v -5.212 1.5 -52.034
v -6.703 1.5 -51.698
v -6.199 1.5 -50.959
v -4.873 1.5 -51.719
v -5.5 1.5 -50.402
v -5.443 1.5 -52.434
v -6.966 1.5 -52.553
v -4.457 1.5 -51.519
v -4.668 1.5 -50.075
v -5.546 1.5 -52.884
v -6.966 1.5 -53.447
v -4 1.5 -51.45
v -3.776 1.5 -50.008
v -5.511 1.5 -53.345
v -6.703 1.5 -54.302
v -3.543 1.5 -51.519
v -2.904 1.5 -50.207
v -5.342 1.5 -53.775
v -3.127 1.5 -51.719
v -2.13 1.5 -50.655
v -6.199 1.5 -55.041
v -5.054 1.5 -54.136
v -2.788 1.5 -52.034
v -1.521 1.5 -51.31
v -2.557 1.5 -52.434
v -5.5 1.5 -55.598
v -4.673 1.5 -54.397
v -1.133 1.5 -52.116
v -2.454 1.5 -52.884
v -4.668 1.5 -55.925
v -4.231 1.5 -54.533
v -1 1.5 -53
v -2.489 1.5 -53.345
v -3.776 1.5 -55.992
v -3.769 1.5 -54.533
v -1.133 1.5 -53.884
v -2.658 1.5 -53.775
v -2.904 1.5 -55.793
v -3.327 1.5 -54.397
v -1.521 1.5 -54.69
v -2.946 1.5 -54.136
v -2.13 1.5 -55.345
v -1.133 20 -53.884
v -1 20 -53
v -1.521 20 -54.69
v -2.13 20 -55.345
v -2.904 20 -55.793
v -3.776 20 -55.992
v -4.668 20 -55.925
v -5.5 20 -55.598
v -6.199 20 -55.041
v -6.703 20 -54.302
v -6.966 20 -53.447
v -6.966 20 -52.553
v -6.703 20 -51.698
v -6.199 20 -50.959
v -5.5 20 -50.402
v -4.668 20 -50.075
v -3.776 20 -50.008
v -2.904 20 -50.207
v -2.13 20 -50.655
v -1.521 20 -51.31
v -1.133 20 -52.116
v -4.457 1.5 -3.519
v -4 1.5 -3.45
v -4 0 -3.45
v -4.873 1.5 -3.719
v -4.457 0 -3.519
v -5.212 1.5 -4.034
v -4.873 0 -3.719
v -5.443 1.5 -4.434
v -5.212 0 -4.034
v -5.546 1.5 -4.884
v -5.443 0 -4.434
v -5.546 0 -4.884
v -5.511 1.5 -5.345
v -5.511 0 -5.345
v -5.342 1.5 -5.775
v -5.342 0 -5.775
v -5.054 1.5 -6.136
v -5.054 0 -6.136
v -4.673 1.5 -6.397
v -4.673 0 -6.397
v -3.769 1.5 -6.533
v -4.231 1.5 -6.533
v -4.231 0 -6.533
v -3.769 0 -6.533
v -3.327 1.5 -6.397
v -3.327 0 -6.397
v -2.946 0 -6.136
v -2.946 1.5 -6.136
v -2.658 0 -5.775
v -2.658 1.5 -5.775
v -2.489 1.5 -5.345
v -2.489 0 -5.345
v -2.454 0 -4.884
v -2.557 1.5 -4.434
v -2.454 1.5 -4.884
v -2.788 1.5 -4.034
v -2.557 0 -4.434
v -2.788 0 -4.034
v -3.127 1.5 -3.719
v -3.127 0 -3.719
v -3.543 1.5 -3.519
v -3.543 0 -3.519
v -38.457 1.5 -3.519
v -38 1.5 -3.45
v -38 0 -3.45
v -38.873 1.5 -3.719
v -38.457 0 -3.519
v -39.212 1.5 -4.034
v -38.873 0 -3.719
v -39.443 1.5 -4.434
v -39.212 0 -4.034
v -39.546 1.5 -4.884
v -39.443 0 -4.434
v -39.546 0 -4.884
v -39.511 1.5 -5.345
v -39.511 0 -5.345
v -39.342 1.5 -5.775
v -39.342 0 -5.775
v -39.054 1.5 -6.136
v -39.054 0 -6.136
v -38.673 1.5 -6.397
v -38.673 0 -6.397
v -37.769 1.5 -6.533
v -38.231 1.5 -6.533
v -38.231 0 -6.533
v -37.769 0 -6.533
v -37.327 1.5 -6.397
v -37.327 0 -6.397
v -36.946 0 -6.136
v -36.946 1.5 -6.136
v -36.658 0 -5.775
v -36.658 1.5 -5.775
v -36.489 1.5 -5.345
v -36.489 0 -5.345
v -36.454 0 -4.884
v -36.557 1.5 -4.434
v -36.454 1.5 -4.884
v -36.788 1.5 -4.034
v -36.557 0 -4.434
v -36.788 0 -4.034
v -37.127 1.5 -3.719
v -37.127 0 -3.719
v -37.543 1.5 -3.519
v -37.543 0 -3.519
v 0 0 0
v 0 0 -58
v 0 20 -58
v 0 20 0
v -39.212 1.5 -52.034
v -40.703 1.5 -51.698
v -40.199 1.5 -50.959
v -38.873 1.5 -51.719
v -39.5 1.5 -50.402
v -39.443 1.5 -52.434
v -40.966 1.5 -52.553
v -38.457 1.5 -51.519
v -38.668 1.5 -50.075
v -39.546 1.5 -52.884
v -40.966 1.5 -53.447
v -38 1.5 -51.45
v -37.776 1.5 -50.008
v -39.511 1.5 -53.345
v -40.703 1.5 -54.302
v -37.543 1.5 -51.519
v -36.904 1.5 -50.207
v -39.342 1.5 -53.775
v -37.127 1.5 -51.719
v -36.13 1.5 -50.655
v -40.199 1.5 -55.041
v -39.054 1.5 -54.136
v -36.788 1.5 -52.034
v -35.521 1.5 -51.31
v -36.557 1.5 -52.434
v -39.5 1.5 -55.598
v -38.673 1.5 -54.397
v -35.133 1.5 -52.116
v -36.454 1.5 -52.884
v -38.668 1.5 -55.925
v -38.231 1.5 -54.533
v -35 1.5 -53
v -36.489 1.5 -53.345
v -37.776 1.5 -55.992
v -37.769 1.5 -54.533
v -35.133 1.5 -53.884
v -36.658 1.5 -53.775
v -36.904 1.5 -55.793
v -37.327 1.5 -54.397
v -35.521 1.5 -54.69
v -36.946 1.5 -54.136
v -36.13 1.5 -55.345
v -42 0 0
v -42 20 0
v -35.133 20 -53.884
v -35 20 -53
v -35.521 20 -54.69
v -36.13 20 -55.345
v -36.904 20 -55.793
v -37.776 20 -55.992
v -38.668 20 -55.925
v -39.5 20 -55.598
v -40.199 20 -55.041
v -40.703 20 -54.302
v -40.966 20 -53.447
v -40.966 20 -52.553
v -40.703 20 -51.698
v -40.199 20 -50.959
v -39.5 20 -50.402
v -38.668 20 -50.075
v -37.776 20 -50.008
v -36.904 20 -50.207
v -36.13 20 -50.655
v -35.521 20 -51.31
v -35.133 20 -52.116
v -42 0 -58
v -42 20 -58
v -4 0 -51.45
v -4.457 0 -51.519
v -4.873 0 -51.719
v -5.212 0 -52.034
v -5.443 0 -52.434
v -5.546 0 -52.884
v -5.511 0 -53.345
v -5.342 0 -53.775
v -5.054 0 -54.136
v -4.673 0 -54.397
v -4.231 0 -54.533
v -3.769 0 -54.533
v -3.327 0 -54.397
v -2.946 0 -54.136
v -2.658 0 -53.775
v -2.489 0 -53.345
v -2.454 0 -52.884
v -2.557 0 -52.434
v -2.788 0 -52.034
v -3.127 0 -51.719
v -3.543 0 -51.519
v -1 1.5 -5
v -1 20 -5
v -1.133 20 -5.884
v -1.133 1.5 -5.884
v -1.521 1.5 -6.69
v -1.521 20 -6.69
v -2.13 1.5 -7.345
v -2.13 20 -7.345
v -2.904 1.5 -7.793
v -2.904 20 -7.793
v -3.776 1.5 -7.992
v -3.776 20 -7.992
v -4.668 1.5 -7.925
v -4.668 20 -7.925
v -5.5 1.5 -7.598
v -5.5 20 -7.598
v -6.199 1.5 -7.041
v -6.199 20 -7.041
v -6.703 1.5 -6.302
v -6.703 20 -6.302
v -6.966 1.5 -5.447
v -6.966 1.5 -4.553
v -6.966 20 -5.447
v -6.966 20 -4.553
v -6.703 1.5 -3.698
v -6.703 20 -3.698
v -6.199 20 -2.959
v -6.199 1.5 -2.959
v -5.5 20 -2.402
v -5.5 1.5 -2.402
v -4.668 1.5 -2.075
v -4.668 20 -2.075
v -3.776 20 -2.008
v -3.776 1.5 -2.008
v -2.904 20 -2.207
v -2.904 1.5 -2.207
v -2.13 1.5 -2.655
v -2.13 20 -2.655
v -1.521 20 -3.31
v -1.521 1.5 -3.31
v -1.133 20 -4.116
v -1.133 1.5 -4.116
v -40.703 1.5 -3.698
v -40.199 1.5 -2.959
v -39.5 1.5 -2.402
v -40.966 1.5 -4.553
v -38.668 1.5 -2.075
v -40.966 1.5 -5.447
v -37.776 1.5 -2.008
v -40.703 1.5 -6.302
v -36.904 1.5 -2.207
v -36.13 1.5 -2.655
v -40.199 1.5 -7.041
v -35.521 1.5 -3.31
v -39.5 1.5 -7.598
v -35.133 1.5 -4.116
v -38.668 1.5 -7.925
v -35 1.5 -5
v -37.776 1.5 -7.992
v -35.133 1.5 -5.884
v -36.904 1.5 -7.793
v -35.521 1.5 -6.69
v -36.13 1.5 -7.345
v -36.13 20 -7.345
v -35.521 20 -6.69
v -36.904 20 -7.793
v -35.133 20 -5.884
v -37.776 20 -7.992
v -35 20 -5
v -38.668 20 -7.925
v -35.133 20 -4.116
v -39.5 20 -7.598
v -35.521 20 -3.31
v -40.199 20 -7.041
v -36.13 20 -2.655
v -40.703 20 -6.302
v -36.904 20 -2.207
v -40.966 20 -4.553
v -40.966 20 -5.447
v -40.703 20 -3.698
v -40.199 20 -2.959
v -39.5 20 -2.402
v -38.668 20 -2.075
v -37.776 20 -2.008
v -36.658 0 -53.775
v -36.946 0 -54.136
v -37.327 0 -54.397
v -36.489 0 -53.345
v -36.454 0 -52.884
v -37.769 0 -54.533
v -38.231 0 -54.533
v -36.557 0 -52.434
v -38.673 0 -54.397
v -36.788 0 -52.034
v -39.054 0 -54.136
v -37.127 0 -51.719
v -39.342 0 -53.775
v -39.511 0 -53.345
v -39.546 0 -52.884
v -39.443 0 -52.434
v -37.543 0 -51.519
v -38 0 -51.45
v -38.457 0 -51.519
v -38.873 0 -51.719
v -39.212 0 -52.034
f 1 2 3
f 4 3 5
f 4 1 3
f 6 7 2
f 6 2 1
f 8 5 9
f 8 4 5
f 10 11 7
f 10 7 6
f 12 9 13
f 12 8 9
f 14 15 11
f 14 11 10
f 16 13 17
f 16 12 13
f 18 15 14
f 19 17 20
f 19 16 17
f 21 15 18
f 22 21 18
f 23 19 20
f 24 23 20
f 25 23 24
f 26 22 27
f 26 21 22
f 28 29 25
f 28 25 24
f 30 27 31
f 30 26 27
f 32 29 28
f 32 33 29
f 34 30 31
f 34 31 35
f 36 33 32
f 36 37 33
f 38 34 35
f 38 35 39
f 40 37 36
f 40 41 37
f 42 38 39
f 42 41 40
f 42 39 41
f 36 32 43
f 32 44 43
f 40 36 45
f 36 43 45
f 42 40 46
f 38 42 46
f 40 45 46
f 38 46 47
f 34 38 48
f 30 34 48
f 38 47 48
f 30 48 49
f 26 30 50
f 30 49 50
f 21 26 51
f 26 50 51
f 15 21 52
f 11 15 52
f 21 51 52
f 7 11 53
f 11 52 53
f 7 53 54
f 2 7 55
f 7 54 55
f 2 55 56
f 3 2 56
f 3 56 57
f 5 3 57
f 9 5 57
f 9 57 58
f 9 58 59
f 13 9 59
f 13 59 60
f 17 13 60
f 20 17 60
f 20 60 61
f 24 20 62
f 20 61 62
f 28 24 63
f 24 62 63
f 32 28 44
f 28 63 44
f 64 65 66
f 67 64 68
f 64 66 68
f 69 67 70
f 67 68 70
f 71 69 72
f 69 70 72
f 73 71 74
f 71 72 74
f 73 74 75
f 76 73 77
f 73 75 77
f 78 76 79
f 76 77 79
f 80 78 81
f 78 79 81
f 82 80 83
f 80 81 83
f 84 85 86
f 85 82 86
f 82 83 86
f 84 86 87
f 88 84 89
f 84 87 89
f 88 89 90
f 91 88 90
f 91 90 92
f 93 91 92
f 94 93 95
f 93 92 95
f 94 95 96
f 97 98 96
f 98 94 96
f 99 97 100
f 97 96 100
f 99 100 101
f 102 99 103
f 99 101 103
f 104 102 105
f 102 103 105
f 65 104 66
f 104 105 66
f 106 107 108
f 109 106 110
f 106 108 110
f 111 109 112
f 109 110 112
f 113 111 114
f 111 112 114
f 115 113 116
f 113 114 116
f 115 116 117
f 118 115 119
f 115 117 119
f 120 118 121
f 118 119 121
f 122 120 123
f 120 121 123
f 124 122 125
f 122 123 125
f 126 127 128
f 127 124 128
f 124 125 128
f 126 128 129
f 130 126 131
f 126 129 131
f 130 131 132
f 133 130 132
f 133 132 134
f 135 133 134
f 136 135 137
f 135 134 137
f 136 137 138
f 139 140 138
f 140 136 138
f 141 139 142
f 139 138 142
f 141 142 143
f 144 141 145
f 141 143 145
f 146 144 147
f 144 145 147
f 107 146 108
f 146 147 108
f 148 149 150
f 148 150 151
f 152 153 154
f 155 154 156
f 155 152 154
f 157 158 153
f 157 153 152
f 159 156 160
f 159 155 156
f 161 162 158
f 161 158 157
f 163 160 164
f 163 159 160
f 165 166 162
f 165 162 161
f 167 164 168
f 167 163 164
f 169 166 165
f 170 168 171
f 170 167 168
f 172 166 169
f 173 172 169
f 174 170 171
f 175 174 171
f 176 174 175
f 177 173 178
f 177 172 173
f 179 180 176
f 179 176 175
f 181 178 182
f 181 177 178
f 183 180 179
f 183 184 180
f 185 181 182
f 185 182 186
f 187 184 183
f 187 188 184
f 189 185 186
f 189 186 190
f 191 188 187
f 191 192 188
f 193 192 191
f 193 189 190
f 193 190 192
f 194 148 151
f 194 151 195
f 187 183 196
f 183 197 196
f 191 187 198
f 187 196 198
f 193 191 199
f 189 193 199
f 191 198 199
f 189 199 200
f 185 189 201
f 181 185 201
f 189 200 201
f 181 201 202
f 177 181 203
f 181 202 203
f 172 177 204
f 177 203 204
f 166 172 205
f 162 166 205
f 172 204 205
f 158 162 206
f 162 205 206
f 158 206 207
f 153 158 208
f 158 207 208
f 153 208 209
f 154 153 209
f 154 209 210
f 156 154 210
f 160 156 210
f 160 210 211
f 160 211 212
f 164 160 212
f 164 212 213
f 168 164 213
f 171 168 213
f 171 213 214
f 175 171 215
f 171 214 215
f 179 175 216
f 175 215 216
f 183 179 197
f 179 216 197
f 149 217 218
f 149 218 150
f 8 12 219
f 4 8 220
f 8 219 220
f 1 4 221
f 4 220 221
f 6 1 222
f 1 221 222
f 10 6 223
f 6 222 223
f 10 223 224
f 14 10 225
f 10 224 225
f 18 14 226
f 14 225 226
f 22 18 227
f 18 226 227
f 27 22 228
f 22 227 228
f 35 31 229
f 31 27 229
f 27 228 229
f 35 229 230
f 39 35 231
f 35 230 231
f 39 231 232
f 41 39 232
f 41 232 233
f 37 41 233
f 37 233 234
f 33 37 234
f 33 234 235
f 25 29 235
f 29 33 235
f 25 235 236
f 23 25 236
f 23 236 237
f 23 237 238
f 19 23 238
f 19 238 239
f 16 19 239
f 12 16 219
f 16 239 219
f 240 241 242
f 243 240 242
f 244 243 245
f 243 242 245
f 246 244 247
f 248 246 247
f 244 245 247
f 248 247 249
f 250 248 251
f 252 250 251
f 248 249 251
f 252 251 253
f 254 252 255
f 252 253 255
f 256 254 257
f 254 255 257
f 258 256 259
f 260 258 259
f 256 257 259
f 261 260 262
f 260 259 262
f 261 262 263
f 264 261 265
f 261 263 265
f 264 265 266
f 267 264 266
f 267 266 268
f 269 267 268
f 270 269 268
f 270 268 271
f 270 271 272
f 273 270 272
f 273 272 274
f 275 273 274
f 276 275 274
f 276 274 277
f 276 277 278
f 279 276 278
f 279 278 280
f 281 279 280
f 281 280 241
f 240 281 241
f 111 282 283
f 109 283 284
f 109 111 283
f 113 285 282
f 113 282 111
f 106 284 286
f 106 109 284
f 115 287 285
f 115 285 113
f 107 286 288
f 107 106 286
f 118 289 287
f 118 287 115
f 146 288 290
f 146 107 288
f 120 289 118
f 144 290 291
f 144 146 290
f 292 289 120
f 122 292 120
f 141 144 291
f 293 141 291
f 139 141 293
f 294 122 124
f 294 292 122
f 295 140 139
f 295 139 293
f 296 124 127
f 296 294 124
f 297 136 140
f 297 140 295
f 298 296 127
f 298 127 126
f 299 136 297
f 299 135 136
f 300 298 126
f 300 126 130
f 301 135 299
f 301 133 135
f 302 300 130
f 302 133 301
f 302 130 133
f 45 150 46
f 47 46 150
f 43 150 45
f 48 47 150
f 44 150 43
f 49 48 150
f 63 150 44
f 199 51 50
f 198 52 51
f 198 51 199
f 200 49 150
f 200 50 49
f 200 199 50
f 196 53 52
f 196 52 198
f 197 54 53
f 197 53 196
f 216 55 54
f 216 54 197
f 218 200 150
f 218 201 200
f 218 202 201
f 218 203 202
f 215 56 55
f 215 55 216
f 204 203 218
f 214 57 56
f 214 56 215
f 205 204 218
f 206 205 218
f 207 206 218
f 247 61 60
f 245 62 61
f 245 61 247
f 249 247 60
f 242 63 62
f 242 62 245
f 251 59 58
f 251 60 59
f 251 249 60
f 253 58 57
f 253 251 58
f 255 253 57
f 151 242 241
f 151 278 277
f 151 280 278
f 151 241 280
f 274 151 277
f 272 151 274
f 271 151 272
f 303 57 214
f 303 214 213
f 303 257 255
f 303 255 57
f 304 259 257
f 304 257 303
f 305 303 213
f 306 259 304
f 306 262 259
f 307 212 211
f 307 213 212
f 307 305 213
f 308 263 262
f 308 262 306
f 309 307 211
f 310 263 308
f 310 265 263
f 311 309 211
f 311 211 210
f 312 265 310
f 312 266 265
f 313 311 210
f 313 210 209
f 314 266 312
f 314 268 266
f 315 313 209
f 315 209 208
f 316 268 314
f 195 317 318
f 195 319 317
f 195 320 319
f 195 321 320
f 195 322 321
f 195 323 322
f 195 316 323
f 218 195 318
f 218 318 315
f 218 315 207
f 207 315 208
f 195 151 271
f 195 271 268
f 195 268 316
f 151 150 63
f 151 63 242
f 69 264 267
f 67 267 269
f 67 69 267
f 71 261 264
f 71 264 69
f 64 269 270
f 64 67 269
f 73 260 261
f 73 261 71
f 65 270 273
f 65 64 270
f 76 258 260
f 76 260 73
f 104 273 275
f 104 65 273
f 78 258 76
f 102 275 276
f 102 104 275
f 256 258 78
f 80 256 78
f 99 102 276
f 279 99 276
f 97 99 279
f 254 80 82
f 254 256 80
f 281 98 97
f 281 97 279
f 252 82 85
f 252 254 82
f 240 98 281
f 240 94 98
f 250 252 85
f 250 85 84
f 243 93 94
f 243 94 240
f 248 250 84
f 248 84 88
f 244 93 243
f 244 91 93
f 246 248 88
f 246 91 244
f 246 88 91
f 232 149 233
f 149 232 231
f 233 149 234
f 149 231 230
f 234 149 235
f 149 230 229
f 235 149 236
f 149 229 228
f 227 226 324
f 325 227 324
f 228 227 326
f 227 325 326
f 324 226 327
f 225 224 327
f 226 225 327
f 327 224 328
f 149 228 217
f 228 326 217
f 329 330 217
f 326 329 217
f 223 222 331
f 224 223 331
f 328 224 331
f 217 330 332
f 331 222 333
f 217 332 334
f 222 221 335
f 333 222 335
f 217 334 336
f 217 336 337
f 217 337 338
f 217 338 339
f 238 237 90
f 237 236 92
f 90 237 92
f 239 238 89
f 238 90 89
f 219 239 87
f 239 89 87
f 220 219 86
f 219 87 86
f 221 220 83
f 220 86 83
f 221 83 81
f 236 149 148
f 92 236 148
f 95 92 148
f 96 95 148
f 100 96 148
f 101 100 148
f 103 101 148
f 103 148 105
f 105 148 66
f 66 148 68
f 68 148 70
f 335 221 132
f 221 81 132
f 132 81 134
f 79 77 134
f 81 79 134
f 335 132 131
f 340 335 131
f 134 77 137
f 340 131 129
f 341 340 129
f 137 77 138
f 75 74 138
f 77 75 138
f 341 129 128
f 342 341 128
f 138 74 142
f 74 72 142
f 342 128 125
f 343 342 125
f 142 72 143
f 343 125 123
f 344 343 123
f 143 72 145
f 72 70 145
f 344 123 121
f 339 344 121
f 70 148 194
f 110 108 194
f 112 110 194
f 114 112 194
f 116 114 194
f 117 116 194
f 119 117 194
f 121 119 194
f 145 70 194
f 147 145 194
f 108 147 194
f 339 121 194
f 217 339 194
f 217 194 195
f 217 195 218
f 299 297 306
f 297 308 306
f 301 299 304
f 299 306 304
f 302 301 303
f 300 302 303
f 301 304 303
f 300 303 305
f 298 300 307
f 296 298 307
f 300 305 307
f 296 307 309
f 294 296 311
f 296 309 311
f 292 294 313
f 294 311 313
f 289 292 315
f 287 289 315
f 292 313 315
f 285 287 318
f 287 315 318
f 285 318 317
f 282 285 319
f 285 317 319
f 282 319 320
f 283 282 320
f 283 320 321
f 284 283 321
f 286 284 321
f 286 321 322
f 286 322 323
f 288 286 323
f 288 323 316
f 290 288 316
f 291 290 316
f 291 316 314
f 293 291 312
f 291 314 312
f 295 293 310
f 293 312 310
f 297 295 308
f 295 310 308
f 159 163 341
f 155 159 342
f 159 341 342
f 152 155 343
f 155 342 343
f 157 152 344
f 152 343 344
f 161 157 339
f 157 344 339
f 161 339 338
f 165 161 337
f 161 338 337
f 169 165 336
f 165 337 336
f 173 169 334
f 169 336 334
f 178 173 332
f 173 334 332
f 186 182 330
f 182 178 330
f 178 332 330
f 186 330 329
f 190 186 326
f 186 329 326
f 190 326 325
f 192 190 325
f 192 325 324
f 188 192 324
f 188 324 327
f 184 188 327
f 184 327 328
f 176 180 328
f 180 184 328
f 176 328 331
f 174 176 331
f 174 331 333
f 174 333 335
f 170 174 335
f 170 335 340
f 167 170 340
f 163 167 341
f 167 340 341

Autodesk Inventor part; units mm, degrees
ref_plane "YZ Plane" through (0, 0, 0) normal (1, 0, 0) x (0, 1, 0)
ref_plane "XZ Plane" through (0, 0, 0) normal (0, 1, 0) x (-1, 0, 0)
ref_plane "XY Plane" through (0, 0, 0) normal (0, 0, 1) x (1, 0, 0)
sketch "Sketch1" plane through (0, 0, 0) normal (0, 1, 0) x (-1, 0, 0)
  line L0 (0, 0) -> (42, 0)
  line L1 (42, 0) -> (42, -58)
  line L2 (42, -58) -> (0, -58)
  line L3 (0, -58) -> (0, 0)
  dimension "d0" = 58
  dimension "d1" = 42
extrude "Extrusion1" add sketch "Sketch1" along normal blind 20
sketch "Sketch2" plane through (0, 20, 0) normal (0, 1, 0) x (1, 0, 0)
  line L0 (-29.2926, 35.5201) -> (-17.3649, 35.5201) construction
  line L1 (-17.3649, 35.5201) -> (-17.3649, 9.1969) construction
  line L2 (-17.3649, 9.1969) -> (-29.2926, 9.1969) construction
  line L3 (-29.2926, 9.1969) -> (-29.2926, 35.5201) construction
  spline S0 degree 2 poles (-27.9624, 31.884) (-28.3424, 31.884) (-28.8757, 32.0428) (-29.1111, 32.1562) knots 0 0 0 1 2 2 2
  line L4 (-29.1111, 32.1562) -> (-29.1111, 32.7405)
  line L5 (-29.1111, 32.7405) -> (-29.077, 32.7405)
  spline S1 degree 2 poles (-29.077, 32.7405) (-28.8473, 32.525) (-28.2658, 32.2867) (-27.9964, 32.2867) knots 0 0 0 1 2 2 2
  spline S2 degree 2 poles (-27.9964, 32.2867) (-27.6107, 32.2867) (-27.2164, 32.6072) (-27.2164, 32.871) knots 0 0 0 1 2 2 2
  spline S3 degree 2 poles (-27.2164, 32.871) (-27.2164, 33.0809) (-27.4235, 33.3418) (-27.6475, 33.4071) knots 0 0 0 1 2 2 2
  spline S4 degree 2 poles (-27.6475, 33.4071) (-27.8092, 33.4524) (-28.0787, 33.5148) (-28.28, 33.5659) knots 0 0 0 1 2 2 2
  spline S5 degree 2 poles (-28.28, 33.5659) (-28.4616, 33.6141) (-28.748, 33.7588) (-28.8586, 33.875) knots 0 0 0 1 2 2 2
  spline S6 degree 2 poles (-28.8586, 33.875) (-28.9664, 33.9913) (-29.0855, 34.3033) (-29.0855, 34.5075) knots 0 0 0 1 2 2 2
  spline S7 degree 2 poles (-29.0855, 34.5075) (-29.0855, 34.933) (-28.4218, 35.5088) (-27.9085, 35.5088) knots 0 0 0 1 2 2 2
  spline S8 degree 2 poles (-27.9085, 35.5088) (-27.6135, 35.5088) (-27.0916, 35.3925) (-26.8675, 35.2819) knots 0 0 0 1 2 2 2
  line L6 (-26.8675, 35.2819) -> (-26.8675, 34.7259)
  line L7 (-26.8675, 34.7259) -> (-26.9016, 34.7259)
  spline S9 degree 2 poles (-26.9016, 34.7259) (-27.0689, 34.8791) (-27.5908, 35.106) (-27.8773, 35.106) knots 0 0 0 1 2 2 2
  spline S10 degree 2 poles (-27.8773, 35.106) (-28.2006, 35.106) (-28.6005, 34.8025) (-28.6005, 34.5558) knots 0 0 0 1 2 2 2
  spline S11 degree 2 poles (-28.6005, 34.5558) (-28.6005, 34.3345) (-28.3651, 34.0707) (-28.1439, 34.0112) knots 0 0 0 1 2 2 2
  spline S12 degree 2 poles (-28.1439, 34.0112) (-27.9964, 33.9715) (-27.5681, 33.8694) (-27.4263, 33.8268) knots 0 0 0 1 2 2 2
  spline S13 degree 2 poles (-27.4263, 33.8268) (-27.0661, 33.7162) (-26.7314, 33.2709) (-26.7314, 32.9447) knots 0 0 0 1 2 2 2
  spline S14 degree 2 poles (-26.7314, 32.9447) (-26.7314, 32.7377) (-26.8987, 32.3406) (-27.0491, 32.2016) knots 0 0 0 1 2 2 2
  spline S15 degree 2 poles (-27.0491, 32.2016) (-27.2164, 32.0485) (-27.6419, 31.884) (-27.9624, 31.884) knots 0 0 0 1 2 2 2
  line L8 (-26.2577, 31.9464) -> (-26.2577, 35.4464)
  line L9 (-26.2577, 35.4464) -> (-24.0681, 35.4464)
  line L10 (-24.0681, 35.4464) -> (-24.0681, 35.0323)
  line L11 (-24.0681, 35.0323) -> (-25.7926, 35.0323)
  line L12 (-25.7926, 35.0323) -> (-25.7926, 34.0736)
  line L13 (-25.7926, 34.0736) -> (-24.1844, 34.0736)
  line L14 (-24.1844, 34.0736) -> (-24.1844, 33.6595)
  line L15 (-24.1844, 33.6595) -> (-25.7926, 33.6595)
  line L16 (-25.7926, 33.6595) -> (-25.7926, 32.3605)
  line L17 (-25.7926, 32.3605) -> (-24.0681, 32.3605)
  line L18 (-24.0681, 32.3605) -> (-24.0681, 31.9464)
  line L19 (-24.0681, 31.9464) -> (-26.2577, 31.9464)
  line L20 (-20.8489, 31.9464) -> (-21.453, 31.9464)
  line L21 (-21.453, 31.9464) -> (-22.5592, 33.339)
  line L22 (-22.5592, 33.339) -> (-23.0924, 33.339)
  line L23 (-23.0924, 33.339) -> (-23.0924, 31.9464)
  line L24 (-23.0924, 31.9464) -> (-23.5576, 31.9464)
  line L25 (-23.5576, 31.9464) -> (-23.5576, 35.4464)
  line L26 (-23.5576, 35.4464) -> (-22.6556, 35.4464)
  spline S16 degree 2 poles (-22.6556, 35.4464) (-22.355, 35.4464) (-21.9494, 35.3811) (-21.765, 35.262) knots 0 0 0 1 2 2 2
  spline S17 degree 2 poles (-21.765, 35.262) (-21.5807, 35.1429) (-21.368, 34.7713) (-21.368, 34.4962) knots 0 0 0 1 2 2 2
  spline S18 degree 2 poles (-21.368, 34.4962) (-21.368, 34.1133) (-21.7594, 33.5943) (-22.094, 33.4695) knots 0 0 0 1 2 2 2
  line L27 (-22.094, 33.4695) -> (-20.8489, 31.9464)
  spline S19 degree 2 poles (-21.853, 34.4593) (-21.853, 34.6125) (-21.9607, 34.8479) (-22.0742, 34.9245) knots 0 0 0 1 2 2 2
  spline S20 degree 2 poles (-22.0742, 34.9245) (-22.1735, 34.9897) (-22.4372, 35.0436) (-22.6301, 35.0436) knots 0 0 0 1 2 2 2
  line L28 (-22.6301, 35.0436) -> (-23.0924, 35.0436)
  line L29 (-23.0924, 35.0436) -> (-23.0924, 33.7276)
  line L30 (-23.0924, 33.7276) -> (-22.684, 33.7276)
  spline S21 degree 2 poles (-22.684, 33.7276) (-22.4826, 33.7276) (-22.1621, 33.7985) (-22.0515, 33.9091) knots 0 0 0 1 2 2 2
  spline S22 degree 2 poles (-22.0515, 33.9091) (-21.9494, 34.0055) (-21.853, 34.2778) (-21.853, 34.4593) knots 0 0 0 1 2 2 2
  line L31 (-18.0325, 35.4464) -> (-19.2379, 31.9464)
  line L32 (-19.2379, 31.9464) -> (-19.7399, 31.9464)
  line L33 (-19.7399, 31.9464) -> (-20.9453, 35.4464)
  line L34 (-20.9453, 35.4464) -> (-20.4462, 35.4464)
  line L35 (-20.4462, 35.4464) -> (-19.4761, 32.5391)
  line L36 (-19.4761, 32.5391) -> (-18.5061, 35.4464)
  line L37 (-18.5061, 35.4464) -> (-18.0325, 35.4464)
  spline S23 degree 2 poles (-15.2217, 35.0464) (-15.0231, 34.8139) (-14.8019, 34.1331) (-14.8019, 33.6964) knots 0 0 0 1 2 2 2
  spline S24 degree 2 poles (-14.8019, 33.6964) (-14.8019, 33.2709) (-15.0175, 32.5817) (-15.2217, 32.3491) knots 0 0 0 1 2 2 2
  spline S25 degree 2 poles (-15.2217, 32.3491) (-15.4372, 32.1052) (-16.0073, 31.8726) (-16.3505, 31.8726) knots 0 0 0 1 2 2 2
  spline S26 degree 2 poles (-16.3505, 31.8726) (-16.7051, 31.8726) (-17.2723, 32.1137) (-17.4794, 32.3491) knots 0 0 0 1 2 2 2
  spline S27 degree 2 poles (-17.4794, 32.3491) (-17.6808, 32.5817) (-17.8963, 33.2652) (-17.8963, 33.6964) knots 0 0 0 1 2 2 2
  spline S28 degree 2 poles (-17.8963, 33.6964) (-17.8963, 34.136) (-17.6779, 34.8054) (-17.4765, 35.0464) knots 0 0 0 1 2 2 2
  spline S29 degree 2 poles (-17.4765, 35.0464) (-17.2723, 35.279) (-16.7022, 35.5201) (-16.3505, 35.5201) knots 0 0 0 1 2 2 2
  spline S30 degree 2 poles (-16.3505, 35.5201) (-15.9932, 35.5201) (-15.4202, 35.2705) (-15.2217, 35.0464) knots 0 0 0 1 2 2 2
  spline S31 degree 2 poles (-15.2869, 33.6964) (-15.2869, 34.0424) (-15.4372, 34.5784) (-15.5734, 34.7543) knots 0 0 0 1 2 2 2
  spline S32 degree 2 poles (-15.5734, 34.7543) (-15.7124, 34.9358) (-16.1038, 35.1173) (-16.3477, 35.1173) knots 0 0 0 1 2 2 2
  spline S33 degree 2 poles (-16.3477, 35.1173) (-16.6001, 35.1173) (-16.9802, 34.9415) (-17.1248, 34.7543) knots 0 0 0 1 2 2 2
  spline S34 degree 2 poles (-17.1248, 34.7543) (-17.2638, 34.5756) (-17.4113, 34.0367) (-17.4113, 33.6964) knots 0 0 0 1 2 2 2
  spline S35 degree 2 poles (-17.4113, 33.6964) (-17.4113, 33.0071) (-16.8327, 32.2754) (-16.3477, 32.2754) knots 0 0 0 1 2 2 2
  spline S36 degree 2 poles (-16.3477, 32.2754) (-15.8627, 32.2754) (-15.2869, 33.0071) (-15.2869, 33.6964) knots 0 0 0 1 2 2 2
  spline S37 degree 2 poles (-26.1783, 27.9309) (-26.1783, 27.4515) (-26.5669, 26.6801) (-26.8931, 26.4645) knots 0 0 0 1 2 2 2
  spline S38 degree 2 poles (-26.8931, 26.4645) (-27.1597, 26.2972) (-27.7071, 26.1837) (-28.1325, 26.1837) knots 0 0 0 1 2 2 2
  line L38 (-28.1325, 26.1837) -> (-28.9381, 26.1837)
  line L39 (-28.9381, 26.1837) -> (-28.9381, 29.6837)
  line L40 (-28.9381, 29.6837) -> (-28.141, 29.6837)
  spline S39 degree 2 poles (-28.141, 29.6837) (-27.6475, 29.6837) (-27.0859, 29.5362) (-26.8874, 29.4057) knots 0 0 0 1 2 2 2
  spline S40 degree 2 poles (-26.8874, 29.4057) (-26.5499, 29.1817) (-26.1783, 28.4414) (-26.1783, 27.9309) knots 0 0 0 1 2 2 2
  spline S41 degree 2 poles (-26.6633, 27.9365) (-26.6633, 28.3393) (-26.9299, 28.9094) (-27.1937, 29.0711) knots 0 0 0 1 2 2 2
  spline S42 degree 2 poles (-27.1937, 29.0711) (-27.3809, 29.1817) (-27.8035, 29.2809) (-28.1184, 29.2809) knots 0 0 0 1 2 2 2
  line L41 (-28.1184, 29.2809) -> (-28.4729, 29.2809)
  line L42 (-28.4729, 29.2809) -> (-28.4729, 26.5865)
  line L43 (-28.4729, 26.5865) -> (-28.1184, 26.5865)
  spline S43 degree 2 poles (-28.1184, 26.5865) (-27.8092, 26.5865) (-27.3412, 26.6857) (-27.1512, 26.819) knots 0 0 0 1 2 2 2
  spline S44 degree 2 poles (-27.1512, 26.819) (-26.9073, 26.9835) (-26.6633, 27.5281) (-26.6633, 27.9365) knots 0 0 0 1 2 2 2
  line L44 (-22.9648, 26.1837) -> (-23.5689, 26.1837)
  line L45 (-23.5689, 26.1837) -> (-24.6751, 27.5763)
  line L46 (-24.6751, 27.5763) -> (-25.2083, 27.5763)
  line L47 (-25.2083, 27.5763) -> (-25.2083, 26.1837)
  line L48 (-25.2083, 26.1837) -> (-25.6735, 26.1837)
  line L49 (-25.6735, 26.1837) -> (-25.6735, 29.6837)
  line L50 (-25.6735, 29.6837) -> (-24.7715, 29.6837)
  spline S45 degree 2 poles (-24.7715, 29.6837) (-24.4709, 29.6837) (-24.0653, 29.6185) (-23.8809, 29.4993) knots 0 0 0 1 2 2 2
  spline S46 degree 2 poles (-23.8809, 29.4993) (-23.6966, 29.3802) (-23.4838, 29.0087) (-23.4838, 28.7335) knots 0 0 0 1 2 2 2
  spline S47 degree 2 poles (-23.4838, 28.7335) (-23.4838, 28.3506) (-23.8752, 27.8316) (-24.2099, 27.7068) knots 0 0 0 1 2 2 2
  line L51 (-24.2099, 27.7068) -> (-22.9648, 26.1837)
  spline S48 degree 2 poles (-23.9688, 28.6967) (-23.9688, 28.8498) (-24.0766, 29.0852) (-24.1901, 29.1618) knots 0 0 0 1 2 2 2
  spline S49 degree 2 poles (-24.1901, 29.1618) (-24.2893, 29.2271) (-24.5531, 29.2809) (-24.746, 29.2809) knots 0 0 0 1 2 2 2
  line L52 (-24.746, 29.2809) -> (-25.2083, 29.2809)
  line L53 (-25.2083, 29.2809) -> (-25.2083, 27.9649)
  line L54 (-25.2083, 27.9649) -> (-24.7999, 27.9649)
  spline S50 degree 2 poles (-24.7999, 27.9649) (-24.5985, 27.9649) (-24.278, 28.0358) (-24.1674, 28.1464) knots 0 0 0 1 2 2 2
  spline S51 degree 2 poles (-24.1674, 28.1464) (-24.0653, 28.2429) (-23.9688, 28.5151) (-23.9688, 28.6967) knots 0 0 0 1 2 2 2
  line L55 (-21.4672, 26.1837) -> (-22.823, 26.1837)
  line L56 (-22.823, 26.1837) -> (-22.823, 26.5411)
  line L57 (-22.823, 26.5411) -> (-22.3777, 26.5411)
  line L58 (-22.3777, 26.5411) -> (-22.3777, 29.3263)
  line L59 (-22.3777, 29.3263) -> (-22.823, 29.3263)
  line L60 (-22.823, 29.3263) -> (-22.823, 29.6837)
  line L61 (-22.823, 29.6837) -> (-21.4672, 29.6837)
  line L62 (-21.4672, 29.6837) -> (-21.4672, 29.3263)
  line L63 (-21.4672, 29.3263) -> (-21.9125, 29.3263)
  line L64 (-21.9125, 29.3263) -> (-21.9125, 26.5411)
  line L65 (-21.9125, 26.5411) -> (-21.4672, 26.5411)
  line L66 (-21.4672, 26.5411) -> (-21.4672, 26.1837)
  line L67 (-18.353, 29.6837) -> (-19.5584, 26.1837)
  line L68 (-19.5584, 26.1837) -> (-20.0604, 26.1837)
  line L69 (-20.0604, 26.1837) -> (-21.2658, 29.6837)
  line L70 (-21.2658, 29.6837) -> (-20.7667, 29.6837)
  line L71 (-20.7667, 29.6837) -> (-19.7966, 26.7765)
  line L72 (-19.7966, 26.7765) -> (-18.8266, 29.6837)
  line L73 (-18.8266, 29.6837) -> (-18.353, 29.6837)
  line L74 (-18.0183, 26.1837) -> (-18.0183, 29.6837)
  line L75 (-18.0183, 29.6837) -> (-15.8287, 29.6837)
  line L76 (-15.8287, 29.6837) -> (-15.8287, 29.2696)
  line L77 (-15.8287, 29.2696) -> (-17.5531, 29.2696)
  line L78 (-17.5531, 29.2696) -> (-17.5531, 28.3109)
  line L79 (-17.5531, 28.3109) -> (-15.9449, 28.3109)
  line L80 (-15.9449, 28.3109) -> (-15.9449, 27.8968)
  line L81 (-15.9449, 27.8968) -> (-17.5531, 27.8968)
  line L82 (-17.5531, 27.8968) -> (-17.5531, 26.5978)
  line L83 (-17.5531, 26.5978) -> (-15.8287, 26.5978)
  line L84 (-15.8287, 26.5978) -> (-15.8287, 26.1837)
  line L85 (-15.8287, 26.1837) -> (-18.0183, 26.1837)
  line L86 (-12.6094, 26.1837) -> (-13.2136, 26.1837)
  line L87 (-13.2136, 26.1837) -> (-14.3197, 27.5763)
  line L88 (-14.3197, 27.5763) -> (-14.853, 27.5763)
  line L89 (-14.853, 27.5763) -> (-14.853, 26.1837)
  line L90 (-14.853, 26.1837) -> (-15.3181, 26.1837)
  line L91 (-15.3181, 26.1837) -> (-15.3181, 29.6837)
  line L92 (-15.3181, 29.6837) -> (-14.4162, 29.6837)
  spline S52 degree 2 poles (-14.4162, 29.6837) (-14.1155, 29.6837) (-13.7099, 29.6185) (-13.5256, 29.4993) knots 0 0 0 1 2 2 2
  spline S53 degree 2 poles (-13.5256, 29.4993) (-13.3412, 29.3802) (-13.1285, 29.0087) (-13.1285, 28.7335) knots 0 0 0 1 2 2 2
  spline S54 degree 2 poles (-13.1285, 28.7335) (-13.1285, 28.3506) (-13.5199, 27.8316) (-13.8546, 27.7068) knots 0 0 0 1 2 2 2
  line L93 (-13.8546, 27.7068) -> (-12.6094, 26.1837)
  spline S55 degree 2 poles (-13.6135, 28.6967) (-13.6135, 28.8498) (-13.7213, 29.0852) (-13.8347, 29.1618) knots 0 0 0 1 2 2 2
  spline S56 degree 2 poles (-13.8347, 29.1618) (-13.934, 29.2271) (-14.1978, 29.2809) (-14.3906, 29.2809) knots 0 0 0 1 2 2 2
  line L94 (-14.3906, 29.2809) -> (-14.853, 29.2809)
  line L95 (-14.853, 29.2809) -> (-14.853, 27.9649)
  line L96 (-14.853, 27.9649) -> (-14.4445, 27.9649)
  spline S57 degree 2 poles (-14.4445, 27.9649) (-14.2432, 27.9649) (-13.9227, 28.0358) (-13.812, 28.1464) knots 0 0 0 1 2 2 2
  spline S58 degree 2 poles (-13.812, 28.1464) (-13.7099, 28.2429) (-13.6135, 28.5151) (-13.6135, 28.6967) knots 0 0 0 1 2 2 2
  point P0 (0, 0)
extrude "Extrusion2" add sketch "Sketch2" against normal blind 1
sketch "Sketch5" plane through (0, 20, 0) normal (0, 1, 0) x (1, 0, 0)
  circle A0 centre (-4, 53) radius 1.55
  circle A1 centre (-38, 53) radius 1.55
  circle A2 centre (-38, 5) radius 1.55
  circle A3 centre (-4, 5) radius 1.55
  line L0 (-42, 58) -> (-42, 0) projected
  line L1 (-42, 0) -> (0, 0) projected
  dimension "d6" = 3.1
  dimension "d7" = 3.1
  dimension "d8" = 3.1
  dimension "d9" = 3.1
  dimension "d10" = 34
  dimension "d11" = 48
  dimension "d12" = 48
  dimension "d13" = 34
  dimension "d14" = 0
  dimension "d15" = 0
  dimension "d16" = 4
  dimension "d17" = 5
hole "Hole1" at (-38, 20, -53) at (-38, 20, -5) at (-4, 20, -5) at (-4, 20, -53) direction (0, -1, 0) diameter 3.1 end through all
sketch "Sketch6" plane through (0, 20, 0) normal (0, 1, 0) x (1, 0, 0)
  circle A0 centre (-4, 5) radius 3
  circle A1 centre (-4, 53) radius 3
  circle A2 centre (-38, 53) radius 3
  circle A3 centre (-38, 5) radius 3
  circle A4 centre (-4, 5) radius 1.55 projected
  circle A5 centre (-38, 5) radius 1.55 projected
  circle A6 centre (-38, 53) radius 1.55 projected
  circle A7 centre (-4, 53) radius 1.55 projected
  circle A8 centre (-4, 53) radius 1.55
  circle A9 centre (-38, 5) radius 1.55
  circle A10 centre (-4, 5) radius 1.55
  circle A11 centre (-38, 53) radius 1.55
  point P0 (0, 0)
  dimension "d25" = 6
  dimension "d26" = 6
  dimension "d27" = 6
  dimension "d28" = 6
  dimension "d29" = 3.1
  dimension "d30" = 3.1
  dimension "d31" = 3.1
  dimension "d32" = 3.1
extrude "Extrusion3" cut sketch "Sketch6" against normal blind 18.5
equation "\"d12\" = d11"
equation "\"d13\" = d10"
properties part number "Servo_Driver"
